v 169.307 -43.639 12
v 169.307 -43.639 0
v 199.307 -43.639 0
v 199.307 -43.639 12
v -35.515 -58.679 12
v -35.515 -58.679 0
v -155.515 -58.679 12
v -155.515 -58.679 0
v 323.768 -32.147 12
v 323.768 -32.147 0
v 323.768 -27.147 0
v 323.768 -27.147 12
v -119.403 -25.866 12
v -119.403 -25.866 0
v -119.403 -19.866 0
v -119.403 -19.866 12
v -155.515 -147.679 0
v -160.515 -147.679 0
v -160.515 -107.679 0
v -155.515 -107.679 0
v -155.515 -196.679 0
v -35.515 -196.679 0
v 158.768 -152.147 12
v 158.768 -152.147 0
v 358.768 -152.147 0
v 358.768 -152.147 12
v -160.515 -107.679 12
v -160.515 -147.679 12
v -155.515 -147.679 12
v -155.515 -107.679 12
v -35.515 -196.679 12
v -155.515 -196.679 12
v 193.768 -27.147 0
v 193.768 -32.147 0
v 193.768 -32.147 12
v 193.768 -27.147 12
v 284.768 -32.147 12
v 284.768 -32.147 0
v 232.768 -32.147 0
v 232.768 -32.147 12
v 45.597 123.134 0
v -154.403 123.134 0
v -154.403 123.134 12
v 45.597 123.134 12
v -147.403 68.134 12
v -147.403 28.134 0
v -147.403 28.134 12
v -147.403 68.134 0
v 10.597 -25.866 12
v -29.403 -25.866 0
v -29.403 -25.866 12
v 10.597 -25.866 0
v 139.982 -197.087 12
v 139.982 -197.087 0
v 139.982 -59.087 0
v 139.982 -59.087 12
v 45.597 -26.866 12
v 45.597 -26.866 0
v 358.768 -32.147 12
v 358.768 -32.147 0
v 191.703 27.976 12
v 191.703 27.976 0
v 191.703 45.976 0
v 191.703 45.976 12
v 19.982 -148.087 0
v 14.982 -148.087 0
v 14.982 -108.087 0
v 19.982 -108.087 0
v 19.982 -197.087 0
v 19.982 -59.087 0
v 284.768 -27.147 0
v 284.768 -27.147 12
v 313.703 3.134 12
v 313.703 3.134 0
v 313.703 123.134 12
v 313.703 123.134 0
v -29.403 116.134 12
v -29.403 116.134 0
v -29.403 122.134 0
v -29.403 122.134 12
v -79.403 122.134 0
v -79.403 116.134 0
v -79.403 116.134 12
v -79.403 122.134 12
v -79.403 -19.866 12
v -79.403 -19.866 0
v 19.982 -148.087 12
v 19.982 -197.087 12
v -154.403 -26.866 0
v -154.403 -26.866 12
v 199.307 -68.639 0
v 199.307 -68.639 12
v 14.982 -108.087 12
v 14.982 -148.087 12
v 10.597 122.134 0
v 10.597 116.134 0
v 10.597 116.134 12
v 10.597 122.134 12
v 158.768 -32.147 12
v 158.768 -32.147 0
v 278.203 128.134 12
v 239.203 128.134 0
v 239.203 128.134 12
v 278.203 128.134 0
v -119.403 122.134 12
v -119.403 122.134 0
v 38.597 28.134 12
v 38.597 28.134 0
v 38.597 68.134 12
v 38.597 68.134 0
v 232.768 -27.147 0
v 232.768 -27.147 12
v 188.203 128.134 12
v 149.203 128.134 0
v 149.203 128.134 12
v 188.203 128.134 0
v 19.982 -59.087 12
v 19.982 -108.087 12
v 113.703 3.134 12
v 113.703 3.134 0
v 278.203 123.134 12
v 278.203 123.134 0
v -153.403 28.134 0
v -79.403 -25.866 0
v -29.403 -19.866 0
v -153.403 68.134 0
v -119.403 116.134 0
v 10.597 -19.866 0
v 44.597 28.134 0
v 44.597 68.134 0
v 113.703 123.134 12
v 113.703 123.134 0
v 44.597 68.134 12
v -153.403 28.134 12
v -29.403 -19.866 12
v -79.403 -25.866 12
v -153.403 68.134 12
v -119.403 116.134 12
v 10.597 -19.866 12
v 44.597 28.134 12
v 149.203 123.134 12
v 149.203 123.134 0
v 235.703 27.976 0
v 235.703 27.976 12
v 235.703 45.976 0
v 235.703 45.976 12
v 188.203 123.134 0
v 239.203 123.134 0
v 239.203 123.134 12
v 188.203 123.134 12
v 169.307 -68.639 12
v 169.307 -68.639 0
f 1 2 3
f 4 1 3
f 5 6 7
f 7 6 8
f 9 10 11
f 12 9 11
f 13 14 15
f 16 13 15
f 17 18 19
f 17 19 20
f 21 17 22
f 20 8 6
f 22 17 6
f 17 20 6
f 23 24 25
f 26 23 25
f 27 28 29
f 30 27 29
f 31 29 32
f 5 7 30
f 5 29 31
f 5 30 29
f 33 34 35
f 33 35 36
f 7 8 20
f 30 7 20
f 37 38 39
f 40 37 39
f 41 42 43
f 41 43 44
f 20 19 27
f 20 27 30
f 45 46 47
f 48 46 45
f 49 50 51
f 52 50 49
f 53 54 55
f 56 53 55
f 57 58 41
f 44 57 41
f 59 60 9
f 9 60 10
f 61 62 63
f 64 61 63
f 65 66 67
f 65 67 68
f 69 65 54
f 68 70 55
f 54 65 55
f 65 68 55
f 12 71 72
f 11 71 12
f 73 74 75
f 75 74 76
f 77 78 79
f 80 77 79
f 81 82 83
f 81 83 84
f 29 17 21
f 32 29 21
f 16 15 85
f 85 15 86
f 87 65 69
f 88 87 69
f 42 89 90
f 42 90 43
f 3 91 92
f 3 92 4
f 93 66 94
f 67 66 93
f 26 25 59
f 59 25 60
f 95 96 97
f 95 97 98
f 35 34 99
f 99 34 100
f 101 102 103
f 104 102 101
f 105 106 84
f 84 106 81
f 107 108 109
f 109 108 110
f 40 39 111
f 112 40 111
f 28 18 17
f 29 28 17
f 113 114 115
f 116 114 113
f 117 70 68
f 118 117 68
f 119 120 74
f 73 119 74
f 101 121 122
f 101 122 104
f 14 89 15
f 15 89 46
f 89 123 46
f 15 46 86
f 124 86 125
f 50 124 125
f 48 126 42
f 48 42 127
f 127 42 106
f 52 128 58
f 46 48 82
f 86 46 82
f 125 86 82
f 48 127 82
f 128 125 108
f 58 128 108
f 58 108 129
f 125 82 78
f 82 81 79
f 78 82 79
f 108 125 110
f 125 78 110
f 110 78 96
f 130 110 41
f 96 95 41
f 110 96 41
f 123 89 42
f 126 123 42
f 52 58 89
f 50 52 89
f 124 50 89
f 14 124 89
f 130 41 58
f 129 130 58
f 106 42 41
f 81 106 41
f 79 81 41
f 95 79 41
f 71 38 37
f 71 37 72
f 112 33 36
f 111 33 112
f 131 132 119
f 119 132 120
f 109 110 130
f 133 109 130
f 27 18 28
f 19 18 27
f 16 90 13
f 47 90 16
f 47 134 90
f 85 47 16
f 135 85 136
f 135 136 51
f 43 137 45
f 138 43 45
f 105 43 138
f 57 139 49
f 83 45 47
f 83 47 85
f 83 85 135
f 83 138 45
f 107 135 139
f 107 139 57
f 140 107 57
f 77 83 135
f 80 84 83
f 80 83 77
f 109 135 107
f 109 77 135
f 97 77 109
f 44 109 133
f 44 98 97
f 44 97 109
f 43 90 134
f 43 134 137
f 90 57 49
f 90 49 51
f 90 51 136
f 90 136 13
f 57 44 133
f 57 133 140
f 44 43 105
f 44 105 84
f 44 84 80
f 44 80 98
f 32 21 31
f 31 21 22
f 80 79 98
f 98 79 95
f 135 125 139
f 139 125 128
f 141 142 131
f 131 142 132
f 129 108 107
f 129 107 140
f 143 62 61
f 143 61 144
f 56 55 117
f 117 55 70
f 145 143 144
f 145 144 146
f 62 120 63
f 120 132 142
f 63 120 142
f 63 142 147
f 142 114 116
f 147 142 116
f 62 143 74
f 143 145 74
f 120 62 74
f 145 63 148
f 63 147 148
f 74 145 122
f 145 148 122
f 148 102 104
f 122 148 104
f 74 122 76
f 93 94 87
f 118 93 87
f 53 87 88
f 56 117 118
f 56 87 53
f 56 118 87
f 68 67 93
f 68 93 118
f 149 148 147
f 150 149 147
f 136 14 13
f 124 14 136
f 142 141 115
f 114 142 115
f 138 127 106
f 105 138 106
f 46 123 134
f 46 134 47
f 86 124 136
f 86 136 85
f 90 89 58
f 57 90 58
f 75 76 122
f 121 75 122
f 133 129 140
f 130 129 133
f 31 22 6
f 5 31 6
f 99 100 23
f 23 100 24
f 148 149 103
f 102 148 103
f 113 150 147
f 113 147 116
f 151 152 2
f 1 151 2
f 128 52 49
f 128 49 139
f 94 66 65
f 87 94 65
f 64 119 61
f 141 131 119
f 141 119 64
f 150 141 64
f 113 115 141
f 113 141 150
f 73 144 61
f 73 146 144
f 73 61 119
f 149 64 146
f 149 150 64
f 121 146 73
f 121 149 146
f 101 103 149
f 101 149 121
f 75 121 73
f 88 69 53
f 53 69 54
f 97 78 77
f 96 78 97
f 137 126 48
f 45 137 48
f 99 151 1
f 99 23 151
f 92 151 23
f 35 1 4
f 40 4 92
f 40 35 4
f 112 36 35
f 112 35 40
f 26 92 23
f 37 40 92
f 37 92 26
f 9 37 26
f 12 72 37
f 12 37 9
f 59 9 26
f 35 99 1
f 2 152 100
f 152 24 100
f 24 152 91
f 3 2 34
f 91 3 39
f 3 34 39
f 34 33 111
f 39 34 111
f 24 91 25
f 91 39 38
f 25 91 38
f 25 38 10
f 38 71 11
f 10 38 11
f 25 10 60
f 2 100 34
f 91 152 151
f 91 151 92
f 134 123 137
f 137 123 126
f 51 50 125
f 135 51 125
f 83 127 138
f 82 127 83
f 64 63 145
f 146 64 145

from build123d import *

# Parameters (mm, degrees)
F0_W     = 200
F0_H     = 150
F0_W_2   = 40
F0_H_2   = 6
F0_W_3   = 6
F0_H_3   = 40
F0_W_4   = 5
F0_W_5   = 30
F0_H_4   = 25
F0_W_6   = 44
F0_H_5   = 18
F0_W_7   = 39
F0_H_6   = 5
F1_DEPTH = 12


with BuildPart() as f1:
    # F0 (on Top) → F1 (new body)
    with BuildSketch(Plane.XY):
        Polygon((-35.514796, -58.678674), (-155.514796, -58.678674), (-155.514796, -107.678674), (-155.514796, -147.678674), (-155.514796, -196.678674), (-35.514796, -196.678674), align=None)
        with Locations((-54.403251, 48.133807)):
            Rectangle(F0_W, F0_H)
        with Locations((-99.403251, -22.866193)):
            Rectangle(F0_W_2, F0_H_2, mode=Mode.SUBTRACT)
        with Locations((-9.403251, -22.866193)):
            Rectangle(F0_W_2, F0_H_2, mode=Mode.SUBTRACT)
        with Locations((-150.403251, 48.133807)):
            Rectangle(F0_W_3, F0_H_3, mode=Mode.SUBTRACT)
        with Locations((-99.403251, 119.133807)):
            Rectangle(F0_W_2, F0_H_2, mode=Mode.SUBTRACT)
        with Locations((41.596749, 48.133807)):
            Rectangle(F0_W_3, F0_H_3, mode=Mode.SUBTRACT)
        with Locations((-9.403251, 119.133807)):
            Rectangle(F0_W_2, F0_H_2, mode=Mode.SUBTRACT)
        with Locations((-158.014796, -127.678674)):
            Rectangle(F0_W_4, F0_H_3)
        Polygon((193.767769, -32.147289), (158.767769, -32.147289), (158.767769, -152.147289), (358.767769, -152.147289), (358.767769, -32.147289), (323.767769, -32.147289), (284.767769, -32.147289), (232.767769, -32.147289), align=None)
        with Locations((184.307457, -56.138965)):
            Rectangle(F0_W_5, F0_H_4, mode=Mode.SUBTRACT)
        Polygon((149.202998, 123.133807), (113.702998, 123.133807), (113.702998, 3.133807), (313.702998, 3.133807), (313.702998, 123.133807), (278.202998, 123.133807), (239.202998, 123.133807), (188.202998, 123.133807), align=None)
        with Locations((213.702998, 36.976401)):
            Rectangle(F0_W_6, F0_H_5, mode=Mode.SUBTRACT)
        Polygon((139.982097, -59.087353), (19.982097, -59.087353), (19.982097, -108.087353), (19.982097, -148.087353), (19.982097, -197.087353), (139.982097, -197.087353), align=None)
        with Locations((17.482097, -128.087353)):
            Rectangle(F0_W_4, F0_H_3)
        with Locations((304.267769, -29.647289)):
            Rectangle(F0_W_7, F0_H_6)
        with Locations((213.267769, -29.647289)):
            Rectangle(F0_W_7, F0_H_6)
        with Locations((168.702998, 125.633807)):
            Rectangle(F0_W_7, F0_H_6)
        with Locations((258.702998, 125.633807)):
            Rectangle(F0_W_7, F0_H_6)
    extrude(amount=F1_DEPTH)


solid = f1.part
